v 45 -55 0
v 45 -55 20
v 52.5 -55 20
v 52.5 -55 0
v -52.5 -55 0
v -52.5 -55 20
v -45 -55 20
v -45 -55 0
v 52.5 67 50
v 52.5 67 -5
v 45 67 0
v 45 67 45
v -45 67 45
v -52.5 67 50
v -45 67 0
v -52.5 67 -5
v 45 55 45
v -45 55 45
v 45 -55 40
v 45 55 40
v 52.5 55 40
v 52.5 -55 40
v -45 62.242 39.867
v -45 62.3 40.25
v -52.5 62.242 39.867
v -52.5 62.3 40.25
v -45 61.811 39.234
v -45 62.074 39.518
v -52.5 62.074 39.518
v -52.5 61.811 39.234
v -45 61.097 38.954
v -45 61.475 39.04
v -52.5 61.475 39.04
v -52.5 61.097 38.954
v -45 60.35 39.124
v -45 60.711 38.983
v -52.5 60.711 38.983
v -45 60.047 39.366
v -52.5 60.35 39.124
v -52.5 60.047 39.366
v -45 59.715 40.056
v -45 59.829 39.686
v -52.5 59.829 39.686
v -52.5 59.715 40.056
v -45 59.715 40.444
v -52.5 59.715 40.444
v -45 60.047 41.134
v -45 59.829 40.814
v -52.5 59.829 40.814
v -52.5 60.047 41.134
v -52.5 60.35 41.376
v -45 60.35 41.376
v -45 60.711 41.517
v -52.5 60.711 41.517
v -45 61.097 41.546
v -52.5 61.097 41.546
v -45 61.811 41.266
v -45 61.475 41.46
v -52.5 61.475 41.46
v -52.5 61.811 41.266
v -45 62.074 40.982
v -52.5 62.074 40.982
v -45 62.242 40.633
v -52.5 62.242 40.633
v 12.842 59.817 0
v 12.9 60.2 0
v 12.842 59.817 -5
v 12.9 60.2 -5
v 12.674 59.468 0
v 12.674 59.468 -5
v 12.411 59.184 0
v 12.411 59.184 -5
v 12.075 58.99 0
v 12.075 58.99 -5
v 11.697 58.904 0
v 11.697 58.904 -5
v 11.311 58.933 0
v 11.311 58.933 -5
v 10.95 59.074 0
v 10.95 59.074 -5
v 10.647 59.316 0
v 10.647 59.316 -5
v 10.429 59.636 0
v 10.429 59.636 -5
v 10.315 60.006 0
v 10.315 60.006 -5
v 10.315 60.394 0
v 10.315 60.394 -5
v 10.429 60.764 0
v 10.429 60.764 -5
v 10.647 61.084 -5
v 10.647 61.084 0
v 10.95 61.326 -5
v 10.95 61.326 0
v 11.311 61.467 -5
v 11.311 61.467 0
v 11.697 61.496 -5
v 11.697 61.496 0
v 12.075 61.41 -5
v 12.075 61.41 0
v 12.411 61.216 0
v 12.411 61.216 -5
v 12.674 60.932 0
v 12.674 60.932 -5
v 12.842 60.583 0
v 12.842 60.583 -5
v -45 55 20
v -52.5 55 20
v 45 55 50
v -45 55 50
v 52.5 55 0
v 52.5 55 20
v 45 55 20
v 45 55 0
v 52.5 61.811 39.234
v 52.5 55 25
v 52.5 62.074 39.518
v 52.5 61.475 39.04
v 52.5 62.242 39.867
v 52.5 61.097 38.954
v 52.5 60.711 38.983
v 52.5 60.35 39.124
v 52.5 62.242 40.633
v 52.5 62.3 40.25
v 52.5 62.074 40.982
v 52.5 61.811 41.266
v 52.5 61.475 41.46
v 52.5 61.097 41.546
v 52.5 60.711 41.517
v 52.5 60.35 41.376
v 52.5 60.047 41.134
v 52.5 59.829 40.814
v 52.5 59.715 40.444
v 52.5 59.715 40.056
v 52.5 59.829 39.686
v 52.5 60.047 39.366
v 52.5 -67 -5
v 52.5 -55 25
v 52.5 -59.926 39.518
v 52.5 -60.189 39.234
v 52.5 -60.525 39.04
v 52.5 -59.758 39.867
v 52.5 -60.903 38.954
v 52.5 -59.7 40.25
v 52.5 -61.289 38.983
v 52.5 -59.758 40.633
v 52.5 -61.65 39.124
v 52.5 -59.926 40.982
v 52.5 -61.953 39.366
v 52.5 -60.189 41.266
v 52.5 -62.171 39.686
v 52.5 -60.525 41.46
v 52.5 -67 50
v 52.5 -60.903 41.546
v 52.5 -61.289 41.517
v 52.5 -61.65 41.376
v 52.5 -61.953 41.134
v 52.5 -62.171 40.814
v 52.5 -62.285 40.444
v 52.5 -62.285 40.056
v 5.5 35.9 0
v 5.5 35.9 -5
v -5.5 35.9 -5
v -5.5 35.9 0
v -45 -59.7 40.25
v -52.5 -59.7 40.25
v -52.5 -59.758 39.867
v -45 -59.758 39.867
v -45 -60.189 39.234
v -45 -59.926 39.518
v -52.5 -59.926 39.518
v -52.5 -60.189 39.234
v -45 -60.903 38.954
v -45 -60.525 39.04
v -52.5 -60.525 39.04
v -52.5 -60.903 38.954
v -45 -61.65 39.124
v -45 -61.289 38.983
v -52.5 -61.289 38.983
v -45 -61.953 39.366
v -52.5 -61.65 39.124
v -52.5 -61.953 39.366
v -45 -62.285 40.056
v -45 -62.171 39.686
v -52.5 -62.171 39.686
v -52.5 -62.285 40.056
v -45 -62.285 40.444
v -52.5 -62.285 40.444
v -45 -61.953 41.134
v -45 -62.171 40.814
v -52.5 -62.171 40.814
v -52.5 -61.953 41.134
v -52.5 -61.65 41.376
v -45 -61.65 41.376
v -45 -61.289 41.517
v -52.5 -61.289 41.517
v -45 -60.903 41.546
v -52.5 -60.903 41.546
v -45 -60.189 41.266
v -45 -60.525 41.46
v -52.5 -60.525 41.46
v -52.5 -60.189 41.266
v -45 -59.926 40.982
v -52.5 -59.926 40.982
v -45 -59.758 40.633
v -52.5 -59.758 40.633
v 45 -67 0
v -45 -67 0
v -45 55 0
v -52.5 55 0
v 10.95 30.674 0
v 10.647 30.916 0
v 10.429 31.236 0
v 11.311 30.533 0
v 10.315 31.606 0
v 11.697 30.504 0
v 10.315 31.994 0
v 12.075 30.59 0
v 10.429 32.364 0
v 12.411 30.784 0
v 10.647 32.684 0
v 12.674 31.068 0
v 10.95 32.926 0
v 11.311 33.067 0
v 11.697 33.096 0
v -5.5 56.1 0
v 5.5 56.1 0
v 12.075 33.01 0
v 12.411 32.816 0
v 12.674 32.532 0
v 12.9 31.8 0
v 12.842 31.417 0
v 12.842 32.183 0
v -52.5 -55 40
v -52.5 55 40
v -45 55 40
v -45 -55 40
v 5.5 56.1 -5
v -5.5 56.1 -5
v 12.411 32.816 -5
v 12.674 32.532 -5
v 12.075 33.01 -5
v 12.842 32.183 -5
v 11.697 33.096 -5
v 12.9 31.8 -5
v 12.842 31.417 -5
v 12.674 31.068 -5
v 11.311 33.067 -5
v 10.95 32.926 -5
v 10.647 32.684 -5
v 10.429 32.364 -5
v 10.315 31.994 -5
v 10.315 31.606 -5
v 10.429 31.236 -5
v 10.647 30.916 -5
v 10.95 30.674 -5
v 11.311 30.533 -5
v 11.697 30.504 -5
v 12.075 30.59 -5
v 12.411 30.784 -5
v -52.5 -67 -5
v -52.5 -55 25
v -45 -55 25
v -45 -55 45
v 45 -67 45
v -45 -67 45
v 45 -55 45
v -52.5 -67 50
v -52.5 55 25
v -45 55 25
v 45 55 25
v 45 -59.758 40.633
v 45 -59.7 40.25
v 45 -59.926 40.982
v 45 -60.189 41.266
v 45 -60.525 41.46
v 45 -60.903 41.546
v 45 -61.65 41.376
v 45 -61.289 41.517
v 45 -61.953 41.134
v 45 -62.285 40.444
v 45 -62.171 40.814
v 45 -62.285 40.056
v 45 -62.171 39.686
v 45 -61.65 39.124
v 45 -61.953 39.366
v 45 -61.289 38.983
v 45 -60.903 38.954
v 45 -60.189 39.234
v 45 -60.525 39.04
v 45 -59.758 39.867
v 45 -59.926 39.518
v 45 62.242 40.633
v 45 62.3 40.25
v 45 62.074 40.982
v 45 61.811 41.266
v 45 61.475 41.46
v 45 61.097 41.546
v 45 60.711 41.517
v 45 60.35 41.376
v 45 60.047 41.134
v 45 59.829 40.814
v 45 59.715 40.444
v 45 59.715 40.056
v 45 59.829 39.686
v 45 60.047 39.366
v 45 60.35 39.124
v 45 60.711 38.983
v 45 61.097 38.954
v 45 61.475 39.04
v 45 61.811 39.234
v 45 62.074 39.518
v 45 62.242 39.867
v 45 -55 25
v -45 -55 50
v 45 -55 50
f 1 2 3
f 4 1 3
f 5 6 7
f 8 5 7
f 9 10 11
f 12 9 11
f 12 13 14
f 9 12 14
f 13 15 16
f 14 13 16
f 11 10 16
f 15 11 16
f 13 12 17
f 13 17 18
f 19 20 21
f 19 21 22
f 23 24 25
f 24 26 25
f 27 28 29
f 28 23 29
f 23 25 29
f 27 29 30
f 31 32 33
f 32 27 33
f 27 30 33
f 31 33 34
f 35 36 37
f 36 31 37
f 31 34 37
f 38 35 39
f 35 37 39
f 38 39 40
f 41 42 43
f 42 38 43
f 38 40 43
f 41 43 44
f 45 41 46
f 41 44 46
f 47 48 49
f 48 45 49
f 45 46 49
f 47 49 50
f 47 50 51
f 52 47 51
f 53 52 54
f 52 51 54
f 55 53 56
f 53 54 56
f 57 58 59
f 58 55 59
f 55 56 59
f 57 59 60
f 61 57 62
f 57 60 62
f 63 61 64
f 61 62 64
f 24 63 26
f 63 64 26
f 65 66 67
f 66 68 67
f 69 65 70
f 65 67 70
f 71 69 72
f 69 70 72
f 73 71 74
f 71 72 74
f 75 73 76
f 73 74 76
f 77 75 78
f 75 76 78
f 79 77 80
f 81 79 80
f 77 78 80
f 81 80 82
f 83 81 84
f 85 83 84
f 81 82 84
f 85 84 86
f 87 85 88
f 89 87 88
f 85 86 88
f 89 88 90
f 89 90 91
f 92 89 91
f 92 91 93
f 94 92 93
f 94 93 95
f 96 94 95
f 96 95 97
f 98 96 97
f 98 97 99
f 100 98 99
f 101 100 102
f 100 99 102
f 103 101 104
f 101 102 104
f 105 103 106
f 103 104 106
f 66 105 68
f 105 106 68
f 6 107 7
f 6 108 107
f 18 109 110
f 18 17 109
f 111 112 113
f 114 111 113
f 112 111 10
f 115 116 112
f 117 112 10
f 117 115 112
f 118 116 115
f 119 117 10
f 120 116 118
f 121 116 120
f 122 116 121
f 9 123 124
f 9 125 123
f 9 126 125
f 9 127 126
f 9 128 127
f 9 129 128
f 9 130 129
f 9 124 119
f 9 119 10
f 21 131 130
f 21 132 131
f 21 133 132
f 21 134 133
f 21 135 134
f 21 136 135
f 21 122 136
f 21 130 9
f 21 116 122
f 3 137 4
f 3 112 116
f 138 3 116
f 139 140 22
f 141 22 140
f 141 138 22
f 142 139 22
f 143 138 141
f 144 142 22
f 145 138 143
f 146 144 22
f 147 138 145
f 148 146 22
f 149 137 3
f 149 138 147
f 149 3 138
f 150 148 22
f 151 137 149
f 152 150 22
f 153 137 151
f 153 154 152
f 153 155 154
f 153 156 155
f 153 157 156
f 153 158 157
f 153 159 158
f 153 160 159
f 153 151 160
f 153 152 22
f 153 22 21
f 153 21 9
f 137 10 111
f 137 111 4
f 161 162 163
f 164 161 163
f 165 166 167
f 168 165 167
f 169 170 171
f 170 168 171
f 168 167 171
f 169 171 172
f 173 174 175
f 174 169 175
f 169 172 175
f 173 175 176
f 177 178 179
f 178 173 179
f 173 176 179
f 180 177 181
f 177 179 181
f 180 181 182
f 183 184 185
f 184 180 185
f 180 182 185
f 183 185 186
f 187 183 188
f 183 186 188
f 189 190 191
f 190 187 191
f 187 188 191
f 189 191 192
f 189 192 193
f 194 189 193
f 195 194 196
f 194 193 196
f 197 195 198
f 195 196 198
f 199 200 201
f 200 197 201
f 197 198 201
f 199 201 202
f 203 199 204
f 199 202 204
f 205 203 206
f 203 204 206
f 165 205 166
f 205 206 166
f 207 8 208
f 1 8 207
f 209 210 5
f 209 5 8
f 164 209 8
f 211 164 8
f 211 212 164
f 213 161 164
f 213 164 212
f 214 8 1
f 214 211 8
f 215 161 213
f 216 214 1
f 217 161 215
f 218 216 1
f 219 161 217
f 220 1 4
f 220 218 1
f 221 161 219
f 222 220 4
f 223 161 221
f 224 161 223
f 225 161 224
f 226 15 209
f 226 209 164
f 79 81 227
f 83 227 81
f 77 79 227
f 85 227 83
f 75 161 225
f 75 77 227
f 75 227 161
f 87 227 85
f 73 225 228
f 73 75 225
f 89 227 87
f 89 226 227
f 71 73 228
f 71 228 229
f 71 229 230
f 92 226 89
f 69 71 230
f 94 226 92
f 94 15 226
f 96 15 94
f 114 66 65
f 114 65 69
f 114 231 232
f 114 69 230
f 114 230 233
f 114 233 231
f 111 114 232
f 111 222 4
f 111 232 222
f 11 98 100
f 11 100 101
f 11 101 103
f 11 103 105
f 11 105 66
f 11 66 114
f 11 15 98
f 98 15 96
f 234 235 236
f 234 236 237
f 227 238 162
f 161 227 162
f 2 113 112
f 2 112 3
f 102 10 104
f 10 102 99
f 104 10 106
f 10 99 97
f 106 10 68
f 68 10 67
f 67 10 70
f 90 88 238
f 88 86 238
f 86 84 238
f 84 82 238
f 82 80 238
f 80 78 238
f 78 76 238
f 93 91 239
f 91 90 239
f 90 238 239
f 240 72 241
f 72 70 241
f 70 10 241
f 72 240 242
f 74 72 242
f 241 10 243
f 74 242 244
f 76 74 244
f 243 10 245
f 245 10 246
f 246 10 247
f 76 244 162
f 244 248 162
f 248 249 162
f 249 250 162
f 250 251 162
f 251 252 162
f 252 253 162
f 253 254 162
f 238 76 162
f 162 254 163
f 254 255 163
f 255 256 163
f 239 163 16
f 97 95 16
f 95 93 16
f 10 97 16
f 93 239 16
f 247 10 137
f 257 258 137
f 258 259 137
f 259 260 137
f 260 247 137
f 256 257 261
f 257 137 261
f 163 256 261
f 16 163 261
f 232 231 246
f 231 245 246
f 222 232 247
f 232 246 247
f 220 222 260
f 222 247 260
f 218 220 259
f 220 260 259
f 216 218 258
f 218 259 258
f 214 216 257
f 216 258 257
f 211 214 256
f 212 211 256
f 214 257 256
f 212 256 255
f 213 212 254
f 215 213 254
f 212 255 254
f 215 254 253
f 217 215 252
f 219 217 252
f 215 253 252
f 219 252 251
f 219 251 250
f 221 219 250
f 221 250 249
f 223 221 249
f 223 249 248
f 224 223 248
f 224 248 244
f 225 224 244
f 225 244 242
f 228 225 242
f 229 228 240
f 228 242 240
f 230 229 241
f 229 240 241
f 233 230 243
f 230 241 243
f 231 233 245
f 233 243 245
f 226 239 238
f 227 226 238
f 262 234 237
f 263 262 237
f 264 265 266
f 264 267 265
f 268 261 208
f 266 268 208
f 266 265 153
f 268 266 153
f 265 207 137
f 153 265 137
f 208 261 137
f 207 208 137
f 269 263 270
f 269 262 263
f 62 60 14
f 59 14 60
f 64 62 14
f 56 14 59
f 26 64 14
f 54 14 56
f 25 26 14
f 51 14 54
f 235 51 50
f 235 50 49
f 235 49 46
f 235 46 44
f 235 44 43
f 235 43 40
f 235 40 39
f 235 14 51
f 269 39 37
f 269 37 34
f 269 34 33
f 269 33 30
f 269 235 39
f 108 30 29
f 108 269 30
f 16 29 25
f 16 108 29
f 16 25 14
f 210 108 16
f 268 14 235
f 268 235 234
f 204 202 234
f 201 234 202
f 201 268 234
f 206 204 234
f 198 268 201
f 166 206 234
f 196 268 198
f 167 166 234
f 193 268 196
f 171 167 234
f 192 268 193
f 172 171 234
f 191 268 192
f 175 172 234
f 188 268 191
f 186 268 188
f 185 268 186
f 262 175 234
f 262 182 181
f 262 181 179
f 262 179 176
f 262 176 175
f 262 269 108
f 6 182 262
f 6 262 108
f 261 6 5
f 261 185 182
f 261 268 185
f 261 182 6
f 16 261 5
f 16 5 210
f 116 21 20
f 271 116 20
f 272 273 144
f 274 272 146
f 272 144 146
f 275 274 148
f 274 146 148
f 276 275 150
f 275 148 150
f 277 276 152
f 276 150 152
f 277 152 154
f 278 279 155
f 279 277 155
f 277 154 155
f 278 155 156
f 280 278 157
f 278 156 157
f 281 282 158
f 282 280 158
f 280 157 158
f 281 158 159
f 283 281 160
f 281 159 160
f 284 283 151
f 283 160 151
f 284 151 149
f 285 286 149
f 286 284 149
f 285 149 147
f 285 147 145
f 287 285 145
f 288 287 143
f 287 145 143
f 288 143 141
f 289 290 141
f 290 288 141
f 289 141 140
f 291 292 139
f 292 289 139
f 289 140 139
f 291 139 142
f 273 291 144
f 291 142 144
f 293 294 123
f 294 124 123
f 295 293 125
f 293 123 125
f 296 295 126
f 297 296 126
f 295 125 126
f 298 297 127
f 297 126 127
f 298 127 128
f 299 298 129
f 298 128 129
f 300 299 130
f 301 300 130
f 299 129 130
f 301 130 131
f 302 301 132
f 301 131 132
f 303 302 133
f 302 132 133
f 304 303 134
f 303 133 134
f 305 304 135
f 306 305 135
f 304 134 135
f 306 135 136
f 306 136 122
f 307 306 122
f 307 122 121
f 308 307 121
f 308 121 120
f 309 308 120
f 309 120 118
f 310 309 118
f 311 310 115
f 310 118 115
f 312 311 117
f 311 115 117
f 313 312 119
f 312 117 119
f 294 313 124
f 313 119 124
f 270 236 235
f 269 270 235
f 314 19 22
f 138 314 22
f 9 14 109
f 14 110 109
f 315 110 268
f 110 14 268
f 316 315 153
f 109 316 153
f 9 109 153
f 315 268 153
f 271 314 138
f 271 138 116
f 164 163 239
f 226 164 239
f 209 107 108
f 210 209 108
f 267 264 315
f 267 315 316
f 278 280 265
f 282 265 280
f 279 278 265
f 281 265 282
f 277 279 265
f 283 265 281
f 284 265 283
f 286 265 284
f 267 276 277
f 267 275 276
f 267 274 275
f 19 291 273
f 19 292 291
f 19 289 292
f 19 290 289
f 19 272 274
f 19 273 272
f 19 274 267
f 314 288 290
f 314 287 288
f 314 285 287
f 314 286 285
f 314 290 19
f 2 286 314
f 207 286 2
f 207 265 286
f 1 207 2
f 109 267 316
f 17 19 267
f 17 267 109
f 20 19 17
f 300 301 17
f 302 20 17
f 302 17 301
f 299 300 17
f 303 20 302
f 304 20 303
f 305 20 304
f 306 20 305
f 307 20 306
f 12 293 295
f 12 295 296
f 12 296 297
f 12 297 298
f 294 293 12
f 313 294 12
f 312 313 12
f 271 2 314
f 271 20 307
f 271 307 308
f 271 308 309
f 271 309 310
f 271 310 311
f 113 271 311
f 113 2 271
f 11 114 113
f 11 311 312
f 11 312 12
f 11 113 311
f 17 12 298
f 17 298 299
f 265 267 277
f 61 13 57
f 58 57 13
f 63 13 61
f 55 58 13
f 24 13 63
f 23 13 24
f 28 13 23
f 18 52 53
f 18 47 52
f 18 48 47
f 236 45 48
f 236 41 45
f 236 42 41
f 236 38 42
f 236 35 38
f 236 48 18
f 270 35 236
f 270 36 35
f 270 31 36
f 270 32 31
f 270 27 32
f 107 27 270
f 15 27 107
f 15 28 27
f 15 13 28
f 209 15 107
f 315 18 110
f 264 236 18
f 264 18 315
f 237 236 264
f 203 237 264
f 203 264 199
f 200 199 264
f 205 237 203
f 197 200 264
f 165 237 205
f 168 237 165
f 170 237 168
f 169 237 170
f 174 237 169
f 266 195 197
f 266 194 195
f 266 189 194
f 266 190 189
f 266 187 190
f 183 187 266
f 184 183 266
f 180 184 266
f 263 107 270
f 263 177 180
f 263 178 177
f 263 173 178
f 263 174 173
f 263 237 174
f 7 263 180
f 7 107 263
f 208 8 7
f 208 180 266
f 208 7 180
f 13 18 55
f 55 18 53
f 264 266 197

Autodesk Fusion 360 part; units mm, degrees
sketch "Çizim1" plane through (0, 0, 0) normal (0, 0, 1) x (1, 0, 0)
  line L0 (52.5, 65) -> (-52.5, 65)
  line L1 (-52.5, 65) -> (-52.5, -65)
  line L2 (-52.5, -65) -> (52.5, -65)
  line L3 (52.5, -65) -> (52.5, 65)
  line L4 (52.5, 65) -> (-52.5, -65) construction
  line L5 (-52.5, 65) -> (52.5, -65) construction
  dimension "d1" = 105
  dimension "d2" = 130
extrude "Ekstrüzyon1" add sketch "Çizim1" against normal blind 5
sketch "Çizim2" plane through (0, 0, 0) normal (0, 0, 1) x (-1, 0, 0)
  line L0 (-52.5, 65) -> (-52.5, -65)
  line L1 (-52.5, -65) -> (52.5, -65)
  line L2 (52.5, -65) -> (52.5, 65)
  line L3 (52.5, 65) -> (-52.5, 65)
  line L4 (47.5, 60) -> (-47.5, 60)
  line L5 (-47.5, 60) -> (-47.5, -60)
  line L6 (-47.5, -60) -> (47.5, -60)
  line L7 (47.5, -60) -> (47.5, 60)
  dimension "d5" = -5
extrude "Ekstrüzyon2" add sketch "Çizim2" along normal blind 30
extrude "Ekstrüzyon3" add 1 faces at (-47.5, 20, 10) along direction (1, 0, 0) blind 2.5
extrude "Ekstrüzyon4" add 1 faces at (47.5, -20, 10) along direction (-1, 0, 0) blind 2.5
extrude "Ekstrüzyon5" add 1 faces at (-50, 20, 30) along direction (0, 0, 1) blind 20
extrude "Ekstrüzyon6" add 1 faces at (-17.5, -65, 13.3333) along direction (0, -1, 0) blind 2
extrude "Ekstrüzyon7" add 1 faces at (-17.5, 65, 31.6667) along direction (0, 1, 0) blind 2
sketch "Çizim4" plane through (52.5, 0, 0) normal (1, 0, 0) x (0, 1, 0)
  line L0 (-67, -5) -> (67, -5)
  line L1 (67, -5) -> (67, 50)
  line L2 (67, 50) -> (-67, 50)
  line L3 (-67, 50) -> (-67, -5)
  circle A0 centre (-61, 40.25) radius 1.3
  line L4 (0, 50) -> (0, -5)
  circle A1 centre (61, 40.25) radius 1.3
  dimension "d18" = 2.6
  dimension "d19" = 9.75
  dimension "d20" = 6
extrude "Ekstrüzyon8" cut sketch "Çizim4" against normal blind 7.5 contours A0 | A1
extrude "Ekstrüzyon9" add 1 faces at (-15, 60, 29.8064) along direction (0, -1, 0) blind 5
extrude "Ekstrüzyon10" add 1 faces at (-15, -60, 29.8064) along direction (0, 1, 0) blind 5
mirror "Ayna1" about plane through (0, 0, 0) normal (1, 0, 0) of "Ekstrüzyon8"
sketch "Çizim5" plane through (-52.5, 0, 0) normal (-1, 0, 0) x (0, -1, 0)
  circle A0 centre (61, 40.25) radius 1.3
  circle A1 centre (-61, 40.25) radius 1.3
  line L0 (-67, -5) -> (67, -5)
  line L1 (67, -5) -> (67, 50)
  line L2 (67, 50) -> (-67, 50)
  line L3 (-67, 50) -> (-67, -5)
  line L4 (-55, 40) -> (-55, 25)
  line L5 (55, 40) -> (55, 25)
  line L6 (-55, 40) -> (55, 40)
  line L7 (55, 40) -> (55, 25)
  line L8 (55, 25) -> (-55, 25)
  line L9 (-55, 25) -> (-55, 40)
  dimension "d29" = 12
  dimension "d30" = 15
  dimension "d31" = 15
  dimension "d32" = 12
  dimension "d33" = 10
extrude "Ekstrüzyon11" cut sketch "Çizim5" against normal blind 105 contours L4 L5 L6 L7 L8 L9
sketch "Çizim6" plane through (-52.5, 0, 0) normal (-1, 0, 0) x (0, -1, 0)
  line L0 (55, 40) -> (55, 25)
  line L1 (55, 25) -> (-55, 25)
  line L2 (-55, 25) -> (-55, 40)
  line L3 (-55, 40) -> (55, 40)
  circle A0 centre (61, 40.25) radius 1.3
  circle A1 centre (-61, 40.25) radius 1.3
  line L4 (-67, -5) -> (67, -5)
  line L5 (67, -5) -> (67, 50)
  line L6 (67, 50) -> (-67, 50)
  line L7 (-67, 50) -> (-67, -5)
  line L8 (55, 25) -> (55, -5)
  line L9 (-55, 25) -> (-55, -5)
  line L10 (-55, 10) -> (55, 10)
  line L11 (-55, 20) -> (55, 20)
  line L12 (55, 20) -> (55, 0)
  line L13 (55, 0) -> (-55, 0)
  line L14 (-55, 0) -> (-55, 20)
extrude "Ekstrüzyon12" cut sketch "Çizim6" against normal blind 105 contours L8 L9 L10 L11 L12 L14 | L8 L9 L10 L12 L13 L14
sketch "Çizim7" plane through (0, 67, 0) normal (0, 1, 0) x (-1, 0, 0)
  line L0 (-52.5, 50) -> (-52.5, -5)
  line L1 (-52.5, -5) -> (52.5, -5)
  line L2 (52.5, -5) -> (52.5, 50)
  line L3 (52.5, 50) -> (-52.5, 50)
  line L4 (-45, 50) -> (-45, -5)
  line L5 (45, 50) -> (45, -5)
  line L6 (-45, 45) -> (45, 45)
  line L7 (45, 45) -> (45, 0)
  line L8 (45, 0) -> (-45, 0)
  line L9 (-45, 0) -> (-45, 45)
  dimension "d38" = 7.5
  dimension "d39" = 7.5
extrude "Ekstrüzyon13" cut sketch "Çizim7" against normal blind 134 contours L4 L5 L6 L7 L8 L9
sketch "Çizim8" plane through (0, 0, -5) normal (0, 0, -1) x (1, 0, 0)
  line L0 (52.5, -67) -> (52.5, 67)
  line L1 (52.5, 67) -> (-52.5, 67)
  line L2 (-52.5, 67) -> (-52.5, -67)
  line L3 (-52.5, -67) -> (52.5, -67)
  line L4 (5.5, -35.9) -> (-5.5, -35.9)
  line L5 (-5.5, -35.9) -> (-5.5, -56.1)
  line L6 (-5.5, -56.1) -> (5.5, -56.1)
  line L7 (5.5, -56.1) -> (5.5, -35.9)
  line L8 (0, -35.9) -> (0, -56.1)
  circle A0 centre (11.6, -31.8) radius 1.3
  circle A1 centre (11.6, -60.2) radius 1.3
  line L9 (11.6, -31.8) -> (11.6, -33.1)
  line L10 (11.6, -31.8) -> (11.6, -33.1)
  line L11 (11.6, -58.9) -> (11.6, -60.2)
  line L12 (11.6, -31.8) -> (11.6, -60.2)
  line L13 (11.6, -46) -> (5.5, -46)
  point P0 (5.5, -46)
  dimension "d42" = 11
  dimension "d43" = 20.2
  dimension "d44" = 10.9
  dimension "d45" = 28.4
  dimension "d46" = 2.6
  dimension "d47" = 2.6
  dimension "d48" = 6.1
extrude "Ekstrüzyon14" cut sketch "Çizim8" against normal blind 5 contours L4 L6 L7 L8 | A0 | A1 | L4 L5 L6 L8
